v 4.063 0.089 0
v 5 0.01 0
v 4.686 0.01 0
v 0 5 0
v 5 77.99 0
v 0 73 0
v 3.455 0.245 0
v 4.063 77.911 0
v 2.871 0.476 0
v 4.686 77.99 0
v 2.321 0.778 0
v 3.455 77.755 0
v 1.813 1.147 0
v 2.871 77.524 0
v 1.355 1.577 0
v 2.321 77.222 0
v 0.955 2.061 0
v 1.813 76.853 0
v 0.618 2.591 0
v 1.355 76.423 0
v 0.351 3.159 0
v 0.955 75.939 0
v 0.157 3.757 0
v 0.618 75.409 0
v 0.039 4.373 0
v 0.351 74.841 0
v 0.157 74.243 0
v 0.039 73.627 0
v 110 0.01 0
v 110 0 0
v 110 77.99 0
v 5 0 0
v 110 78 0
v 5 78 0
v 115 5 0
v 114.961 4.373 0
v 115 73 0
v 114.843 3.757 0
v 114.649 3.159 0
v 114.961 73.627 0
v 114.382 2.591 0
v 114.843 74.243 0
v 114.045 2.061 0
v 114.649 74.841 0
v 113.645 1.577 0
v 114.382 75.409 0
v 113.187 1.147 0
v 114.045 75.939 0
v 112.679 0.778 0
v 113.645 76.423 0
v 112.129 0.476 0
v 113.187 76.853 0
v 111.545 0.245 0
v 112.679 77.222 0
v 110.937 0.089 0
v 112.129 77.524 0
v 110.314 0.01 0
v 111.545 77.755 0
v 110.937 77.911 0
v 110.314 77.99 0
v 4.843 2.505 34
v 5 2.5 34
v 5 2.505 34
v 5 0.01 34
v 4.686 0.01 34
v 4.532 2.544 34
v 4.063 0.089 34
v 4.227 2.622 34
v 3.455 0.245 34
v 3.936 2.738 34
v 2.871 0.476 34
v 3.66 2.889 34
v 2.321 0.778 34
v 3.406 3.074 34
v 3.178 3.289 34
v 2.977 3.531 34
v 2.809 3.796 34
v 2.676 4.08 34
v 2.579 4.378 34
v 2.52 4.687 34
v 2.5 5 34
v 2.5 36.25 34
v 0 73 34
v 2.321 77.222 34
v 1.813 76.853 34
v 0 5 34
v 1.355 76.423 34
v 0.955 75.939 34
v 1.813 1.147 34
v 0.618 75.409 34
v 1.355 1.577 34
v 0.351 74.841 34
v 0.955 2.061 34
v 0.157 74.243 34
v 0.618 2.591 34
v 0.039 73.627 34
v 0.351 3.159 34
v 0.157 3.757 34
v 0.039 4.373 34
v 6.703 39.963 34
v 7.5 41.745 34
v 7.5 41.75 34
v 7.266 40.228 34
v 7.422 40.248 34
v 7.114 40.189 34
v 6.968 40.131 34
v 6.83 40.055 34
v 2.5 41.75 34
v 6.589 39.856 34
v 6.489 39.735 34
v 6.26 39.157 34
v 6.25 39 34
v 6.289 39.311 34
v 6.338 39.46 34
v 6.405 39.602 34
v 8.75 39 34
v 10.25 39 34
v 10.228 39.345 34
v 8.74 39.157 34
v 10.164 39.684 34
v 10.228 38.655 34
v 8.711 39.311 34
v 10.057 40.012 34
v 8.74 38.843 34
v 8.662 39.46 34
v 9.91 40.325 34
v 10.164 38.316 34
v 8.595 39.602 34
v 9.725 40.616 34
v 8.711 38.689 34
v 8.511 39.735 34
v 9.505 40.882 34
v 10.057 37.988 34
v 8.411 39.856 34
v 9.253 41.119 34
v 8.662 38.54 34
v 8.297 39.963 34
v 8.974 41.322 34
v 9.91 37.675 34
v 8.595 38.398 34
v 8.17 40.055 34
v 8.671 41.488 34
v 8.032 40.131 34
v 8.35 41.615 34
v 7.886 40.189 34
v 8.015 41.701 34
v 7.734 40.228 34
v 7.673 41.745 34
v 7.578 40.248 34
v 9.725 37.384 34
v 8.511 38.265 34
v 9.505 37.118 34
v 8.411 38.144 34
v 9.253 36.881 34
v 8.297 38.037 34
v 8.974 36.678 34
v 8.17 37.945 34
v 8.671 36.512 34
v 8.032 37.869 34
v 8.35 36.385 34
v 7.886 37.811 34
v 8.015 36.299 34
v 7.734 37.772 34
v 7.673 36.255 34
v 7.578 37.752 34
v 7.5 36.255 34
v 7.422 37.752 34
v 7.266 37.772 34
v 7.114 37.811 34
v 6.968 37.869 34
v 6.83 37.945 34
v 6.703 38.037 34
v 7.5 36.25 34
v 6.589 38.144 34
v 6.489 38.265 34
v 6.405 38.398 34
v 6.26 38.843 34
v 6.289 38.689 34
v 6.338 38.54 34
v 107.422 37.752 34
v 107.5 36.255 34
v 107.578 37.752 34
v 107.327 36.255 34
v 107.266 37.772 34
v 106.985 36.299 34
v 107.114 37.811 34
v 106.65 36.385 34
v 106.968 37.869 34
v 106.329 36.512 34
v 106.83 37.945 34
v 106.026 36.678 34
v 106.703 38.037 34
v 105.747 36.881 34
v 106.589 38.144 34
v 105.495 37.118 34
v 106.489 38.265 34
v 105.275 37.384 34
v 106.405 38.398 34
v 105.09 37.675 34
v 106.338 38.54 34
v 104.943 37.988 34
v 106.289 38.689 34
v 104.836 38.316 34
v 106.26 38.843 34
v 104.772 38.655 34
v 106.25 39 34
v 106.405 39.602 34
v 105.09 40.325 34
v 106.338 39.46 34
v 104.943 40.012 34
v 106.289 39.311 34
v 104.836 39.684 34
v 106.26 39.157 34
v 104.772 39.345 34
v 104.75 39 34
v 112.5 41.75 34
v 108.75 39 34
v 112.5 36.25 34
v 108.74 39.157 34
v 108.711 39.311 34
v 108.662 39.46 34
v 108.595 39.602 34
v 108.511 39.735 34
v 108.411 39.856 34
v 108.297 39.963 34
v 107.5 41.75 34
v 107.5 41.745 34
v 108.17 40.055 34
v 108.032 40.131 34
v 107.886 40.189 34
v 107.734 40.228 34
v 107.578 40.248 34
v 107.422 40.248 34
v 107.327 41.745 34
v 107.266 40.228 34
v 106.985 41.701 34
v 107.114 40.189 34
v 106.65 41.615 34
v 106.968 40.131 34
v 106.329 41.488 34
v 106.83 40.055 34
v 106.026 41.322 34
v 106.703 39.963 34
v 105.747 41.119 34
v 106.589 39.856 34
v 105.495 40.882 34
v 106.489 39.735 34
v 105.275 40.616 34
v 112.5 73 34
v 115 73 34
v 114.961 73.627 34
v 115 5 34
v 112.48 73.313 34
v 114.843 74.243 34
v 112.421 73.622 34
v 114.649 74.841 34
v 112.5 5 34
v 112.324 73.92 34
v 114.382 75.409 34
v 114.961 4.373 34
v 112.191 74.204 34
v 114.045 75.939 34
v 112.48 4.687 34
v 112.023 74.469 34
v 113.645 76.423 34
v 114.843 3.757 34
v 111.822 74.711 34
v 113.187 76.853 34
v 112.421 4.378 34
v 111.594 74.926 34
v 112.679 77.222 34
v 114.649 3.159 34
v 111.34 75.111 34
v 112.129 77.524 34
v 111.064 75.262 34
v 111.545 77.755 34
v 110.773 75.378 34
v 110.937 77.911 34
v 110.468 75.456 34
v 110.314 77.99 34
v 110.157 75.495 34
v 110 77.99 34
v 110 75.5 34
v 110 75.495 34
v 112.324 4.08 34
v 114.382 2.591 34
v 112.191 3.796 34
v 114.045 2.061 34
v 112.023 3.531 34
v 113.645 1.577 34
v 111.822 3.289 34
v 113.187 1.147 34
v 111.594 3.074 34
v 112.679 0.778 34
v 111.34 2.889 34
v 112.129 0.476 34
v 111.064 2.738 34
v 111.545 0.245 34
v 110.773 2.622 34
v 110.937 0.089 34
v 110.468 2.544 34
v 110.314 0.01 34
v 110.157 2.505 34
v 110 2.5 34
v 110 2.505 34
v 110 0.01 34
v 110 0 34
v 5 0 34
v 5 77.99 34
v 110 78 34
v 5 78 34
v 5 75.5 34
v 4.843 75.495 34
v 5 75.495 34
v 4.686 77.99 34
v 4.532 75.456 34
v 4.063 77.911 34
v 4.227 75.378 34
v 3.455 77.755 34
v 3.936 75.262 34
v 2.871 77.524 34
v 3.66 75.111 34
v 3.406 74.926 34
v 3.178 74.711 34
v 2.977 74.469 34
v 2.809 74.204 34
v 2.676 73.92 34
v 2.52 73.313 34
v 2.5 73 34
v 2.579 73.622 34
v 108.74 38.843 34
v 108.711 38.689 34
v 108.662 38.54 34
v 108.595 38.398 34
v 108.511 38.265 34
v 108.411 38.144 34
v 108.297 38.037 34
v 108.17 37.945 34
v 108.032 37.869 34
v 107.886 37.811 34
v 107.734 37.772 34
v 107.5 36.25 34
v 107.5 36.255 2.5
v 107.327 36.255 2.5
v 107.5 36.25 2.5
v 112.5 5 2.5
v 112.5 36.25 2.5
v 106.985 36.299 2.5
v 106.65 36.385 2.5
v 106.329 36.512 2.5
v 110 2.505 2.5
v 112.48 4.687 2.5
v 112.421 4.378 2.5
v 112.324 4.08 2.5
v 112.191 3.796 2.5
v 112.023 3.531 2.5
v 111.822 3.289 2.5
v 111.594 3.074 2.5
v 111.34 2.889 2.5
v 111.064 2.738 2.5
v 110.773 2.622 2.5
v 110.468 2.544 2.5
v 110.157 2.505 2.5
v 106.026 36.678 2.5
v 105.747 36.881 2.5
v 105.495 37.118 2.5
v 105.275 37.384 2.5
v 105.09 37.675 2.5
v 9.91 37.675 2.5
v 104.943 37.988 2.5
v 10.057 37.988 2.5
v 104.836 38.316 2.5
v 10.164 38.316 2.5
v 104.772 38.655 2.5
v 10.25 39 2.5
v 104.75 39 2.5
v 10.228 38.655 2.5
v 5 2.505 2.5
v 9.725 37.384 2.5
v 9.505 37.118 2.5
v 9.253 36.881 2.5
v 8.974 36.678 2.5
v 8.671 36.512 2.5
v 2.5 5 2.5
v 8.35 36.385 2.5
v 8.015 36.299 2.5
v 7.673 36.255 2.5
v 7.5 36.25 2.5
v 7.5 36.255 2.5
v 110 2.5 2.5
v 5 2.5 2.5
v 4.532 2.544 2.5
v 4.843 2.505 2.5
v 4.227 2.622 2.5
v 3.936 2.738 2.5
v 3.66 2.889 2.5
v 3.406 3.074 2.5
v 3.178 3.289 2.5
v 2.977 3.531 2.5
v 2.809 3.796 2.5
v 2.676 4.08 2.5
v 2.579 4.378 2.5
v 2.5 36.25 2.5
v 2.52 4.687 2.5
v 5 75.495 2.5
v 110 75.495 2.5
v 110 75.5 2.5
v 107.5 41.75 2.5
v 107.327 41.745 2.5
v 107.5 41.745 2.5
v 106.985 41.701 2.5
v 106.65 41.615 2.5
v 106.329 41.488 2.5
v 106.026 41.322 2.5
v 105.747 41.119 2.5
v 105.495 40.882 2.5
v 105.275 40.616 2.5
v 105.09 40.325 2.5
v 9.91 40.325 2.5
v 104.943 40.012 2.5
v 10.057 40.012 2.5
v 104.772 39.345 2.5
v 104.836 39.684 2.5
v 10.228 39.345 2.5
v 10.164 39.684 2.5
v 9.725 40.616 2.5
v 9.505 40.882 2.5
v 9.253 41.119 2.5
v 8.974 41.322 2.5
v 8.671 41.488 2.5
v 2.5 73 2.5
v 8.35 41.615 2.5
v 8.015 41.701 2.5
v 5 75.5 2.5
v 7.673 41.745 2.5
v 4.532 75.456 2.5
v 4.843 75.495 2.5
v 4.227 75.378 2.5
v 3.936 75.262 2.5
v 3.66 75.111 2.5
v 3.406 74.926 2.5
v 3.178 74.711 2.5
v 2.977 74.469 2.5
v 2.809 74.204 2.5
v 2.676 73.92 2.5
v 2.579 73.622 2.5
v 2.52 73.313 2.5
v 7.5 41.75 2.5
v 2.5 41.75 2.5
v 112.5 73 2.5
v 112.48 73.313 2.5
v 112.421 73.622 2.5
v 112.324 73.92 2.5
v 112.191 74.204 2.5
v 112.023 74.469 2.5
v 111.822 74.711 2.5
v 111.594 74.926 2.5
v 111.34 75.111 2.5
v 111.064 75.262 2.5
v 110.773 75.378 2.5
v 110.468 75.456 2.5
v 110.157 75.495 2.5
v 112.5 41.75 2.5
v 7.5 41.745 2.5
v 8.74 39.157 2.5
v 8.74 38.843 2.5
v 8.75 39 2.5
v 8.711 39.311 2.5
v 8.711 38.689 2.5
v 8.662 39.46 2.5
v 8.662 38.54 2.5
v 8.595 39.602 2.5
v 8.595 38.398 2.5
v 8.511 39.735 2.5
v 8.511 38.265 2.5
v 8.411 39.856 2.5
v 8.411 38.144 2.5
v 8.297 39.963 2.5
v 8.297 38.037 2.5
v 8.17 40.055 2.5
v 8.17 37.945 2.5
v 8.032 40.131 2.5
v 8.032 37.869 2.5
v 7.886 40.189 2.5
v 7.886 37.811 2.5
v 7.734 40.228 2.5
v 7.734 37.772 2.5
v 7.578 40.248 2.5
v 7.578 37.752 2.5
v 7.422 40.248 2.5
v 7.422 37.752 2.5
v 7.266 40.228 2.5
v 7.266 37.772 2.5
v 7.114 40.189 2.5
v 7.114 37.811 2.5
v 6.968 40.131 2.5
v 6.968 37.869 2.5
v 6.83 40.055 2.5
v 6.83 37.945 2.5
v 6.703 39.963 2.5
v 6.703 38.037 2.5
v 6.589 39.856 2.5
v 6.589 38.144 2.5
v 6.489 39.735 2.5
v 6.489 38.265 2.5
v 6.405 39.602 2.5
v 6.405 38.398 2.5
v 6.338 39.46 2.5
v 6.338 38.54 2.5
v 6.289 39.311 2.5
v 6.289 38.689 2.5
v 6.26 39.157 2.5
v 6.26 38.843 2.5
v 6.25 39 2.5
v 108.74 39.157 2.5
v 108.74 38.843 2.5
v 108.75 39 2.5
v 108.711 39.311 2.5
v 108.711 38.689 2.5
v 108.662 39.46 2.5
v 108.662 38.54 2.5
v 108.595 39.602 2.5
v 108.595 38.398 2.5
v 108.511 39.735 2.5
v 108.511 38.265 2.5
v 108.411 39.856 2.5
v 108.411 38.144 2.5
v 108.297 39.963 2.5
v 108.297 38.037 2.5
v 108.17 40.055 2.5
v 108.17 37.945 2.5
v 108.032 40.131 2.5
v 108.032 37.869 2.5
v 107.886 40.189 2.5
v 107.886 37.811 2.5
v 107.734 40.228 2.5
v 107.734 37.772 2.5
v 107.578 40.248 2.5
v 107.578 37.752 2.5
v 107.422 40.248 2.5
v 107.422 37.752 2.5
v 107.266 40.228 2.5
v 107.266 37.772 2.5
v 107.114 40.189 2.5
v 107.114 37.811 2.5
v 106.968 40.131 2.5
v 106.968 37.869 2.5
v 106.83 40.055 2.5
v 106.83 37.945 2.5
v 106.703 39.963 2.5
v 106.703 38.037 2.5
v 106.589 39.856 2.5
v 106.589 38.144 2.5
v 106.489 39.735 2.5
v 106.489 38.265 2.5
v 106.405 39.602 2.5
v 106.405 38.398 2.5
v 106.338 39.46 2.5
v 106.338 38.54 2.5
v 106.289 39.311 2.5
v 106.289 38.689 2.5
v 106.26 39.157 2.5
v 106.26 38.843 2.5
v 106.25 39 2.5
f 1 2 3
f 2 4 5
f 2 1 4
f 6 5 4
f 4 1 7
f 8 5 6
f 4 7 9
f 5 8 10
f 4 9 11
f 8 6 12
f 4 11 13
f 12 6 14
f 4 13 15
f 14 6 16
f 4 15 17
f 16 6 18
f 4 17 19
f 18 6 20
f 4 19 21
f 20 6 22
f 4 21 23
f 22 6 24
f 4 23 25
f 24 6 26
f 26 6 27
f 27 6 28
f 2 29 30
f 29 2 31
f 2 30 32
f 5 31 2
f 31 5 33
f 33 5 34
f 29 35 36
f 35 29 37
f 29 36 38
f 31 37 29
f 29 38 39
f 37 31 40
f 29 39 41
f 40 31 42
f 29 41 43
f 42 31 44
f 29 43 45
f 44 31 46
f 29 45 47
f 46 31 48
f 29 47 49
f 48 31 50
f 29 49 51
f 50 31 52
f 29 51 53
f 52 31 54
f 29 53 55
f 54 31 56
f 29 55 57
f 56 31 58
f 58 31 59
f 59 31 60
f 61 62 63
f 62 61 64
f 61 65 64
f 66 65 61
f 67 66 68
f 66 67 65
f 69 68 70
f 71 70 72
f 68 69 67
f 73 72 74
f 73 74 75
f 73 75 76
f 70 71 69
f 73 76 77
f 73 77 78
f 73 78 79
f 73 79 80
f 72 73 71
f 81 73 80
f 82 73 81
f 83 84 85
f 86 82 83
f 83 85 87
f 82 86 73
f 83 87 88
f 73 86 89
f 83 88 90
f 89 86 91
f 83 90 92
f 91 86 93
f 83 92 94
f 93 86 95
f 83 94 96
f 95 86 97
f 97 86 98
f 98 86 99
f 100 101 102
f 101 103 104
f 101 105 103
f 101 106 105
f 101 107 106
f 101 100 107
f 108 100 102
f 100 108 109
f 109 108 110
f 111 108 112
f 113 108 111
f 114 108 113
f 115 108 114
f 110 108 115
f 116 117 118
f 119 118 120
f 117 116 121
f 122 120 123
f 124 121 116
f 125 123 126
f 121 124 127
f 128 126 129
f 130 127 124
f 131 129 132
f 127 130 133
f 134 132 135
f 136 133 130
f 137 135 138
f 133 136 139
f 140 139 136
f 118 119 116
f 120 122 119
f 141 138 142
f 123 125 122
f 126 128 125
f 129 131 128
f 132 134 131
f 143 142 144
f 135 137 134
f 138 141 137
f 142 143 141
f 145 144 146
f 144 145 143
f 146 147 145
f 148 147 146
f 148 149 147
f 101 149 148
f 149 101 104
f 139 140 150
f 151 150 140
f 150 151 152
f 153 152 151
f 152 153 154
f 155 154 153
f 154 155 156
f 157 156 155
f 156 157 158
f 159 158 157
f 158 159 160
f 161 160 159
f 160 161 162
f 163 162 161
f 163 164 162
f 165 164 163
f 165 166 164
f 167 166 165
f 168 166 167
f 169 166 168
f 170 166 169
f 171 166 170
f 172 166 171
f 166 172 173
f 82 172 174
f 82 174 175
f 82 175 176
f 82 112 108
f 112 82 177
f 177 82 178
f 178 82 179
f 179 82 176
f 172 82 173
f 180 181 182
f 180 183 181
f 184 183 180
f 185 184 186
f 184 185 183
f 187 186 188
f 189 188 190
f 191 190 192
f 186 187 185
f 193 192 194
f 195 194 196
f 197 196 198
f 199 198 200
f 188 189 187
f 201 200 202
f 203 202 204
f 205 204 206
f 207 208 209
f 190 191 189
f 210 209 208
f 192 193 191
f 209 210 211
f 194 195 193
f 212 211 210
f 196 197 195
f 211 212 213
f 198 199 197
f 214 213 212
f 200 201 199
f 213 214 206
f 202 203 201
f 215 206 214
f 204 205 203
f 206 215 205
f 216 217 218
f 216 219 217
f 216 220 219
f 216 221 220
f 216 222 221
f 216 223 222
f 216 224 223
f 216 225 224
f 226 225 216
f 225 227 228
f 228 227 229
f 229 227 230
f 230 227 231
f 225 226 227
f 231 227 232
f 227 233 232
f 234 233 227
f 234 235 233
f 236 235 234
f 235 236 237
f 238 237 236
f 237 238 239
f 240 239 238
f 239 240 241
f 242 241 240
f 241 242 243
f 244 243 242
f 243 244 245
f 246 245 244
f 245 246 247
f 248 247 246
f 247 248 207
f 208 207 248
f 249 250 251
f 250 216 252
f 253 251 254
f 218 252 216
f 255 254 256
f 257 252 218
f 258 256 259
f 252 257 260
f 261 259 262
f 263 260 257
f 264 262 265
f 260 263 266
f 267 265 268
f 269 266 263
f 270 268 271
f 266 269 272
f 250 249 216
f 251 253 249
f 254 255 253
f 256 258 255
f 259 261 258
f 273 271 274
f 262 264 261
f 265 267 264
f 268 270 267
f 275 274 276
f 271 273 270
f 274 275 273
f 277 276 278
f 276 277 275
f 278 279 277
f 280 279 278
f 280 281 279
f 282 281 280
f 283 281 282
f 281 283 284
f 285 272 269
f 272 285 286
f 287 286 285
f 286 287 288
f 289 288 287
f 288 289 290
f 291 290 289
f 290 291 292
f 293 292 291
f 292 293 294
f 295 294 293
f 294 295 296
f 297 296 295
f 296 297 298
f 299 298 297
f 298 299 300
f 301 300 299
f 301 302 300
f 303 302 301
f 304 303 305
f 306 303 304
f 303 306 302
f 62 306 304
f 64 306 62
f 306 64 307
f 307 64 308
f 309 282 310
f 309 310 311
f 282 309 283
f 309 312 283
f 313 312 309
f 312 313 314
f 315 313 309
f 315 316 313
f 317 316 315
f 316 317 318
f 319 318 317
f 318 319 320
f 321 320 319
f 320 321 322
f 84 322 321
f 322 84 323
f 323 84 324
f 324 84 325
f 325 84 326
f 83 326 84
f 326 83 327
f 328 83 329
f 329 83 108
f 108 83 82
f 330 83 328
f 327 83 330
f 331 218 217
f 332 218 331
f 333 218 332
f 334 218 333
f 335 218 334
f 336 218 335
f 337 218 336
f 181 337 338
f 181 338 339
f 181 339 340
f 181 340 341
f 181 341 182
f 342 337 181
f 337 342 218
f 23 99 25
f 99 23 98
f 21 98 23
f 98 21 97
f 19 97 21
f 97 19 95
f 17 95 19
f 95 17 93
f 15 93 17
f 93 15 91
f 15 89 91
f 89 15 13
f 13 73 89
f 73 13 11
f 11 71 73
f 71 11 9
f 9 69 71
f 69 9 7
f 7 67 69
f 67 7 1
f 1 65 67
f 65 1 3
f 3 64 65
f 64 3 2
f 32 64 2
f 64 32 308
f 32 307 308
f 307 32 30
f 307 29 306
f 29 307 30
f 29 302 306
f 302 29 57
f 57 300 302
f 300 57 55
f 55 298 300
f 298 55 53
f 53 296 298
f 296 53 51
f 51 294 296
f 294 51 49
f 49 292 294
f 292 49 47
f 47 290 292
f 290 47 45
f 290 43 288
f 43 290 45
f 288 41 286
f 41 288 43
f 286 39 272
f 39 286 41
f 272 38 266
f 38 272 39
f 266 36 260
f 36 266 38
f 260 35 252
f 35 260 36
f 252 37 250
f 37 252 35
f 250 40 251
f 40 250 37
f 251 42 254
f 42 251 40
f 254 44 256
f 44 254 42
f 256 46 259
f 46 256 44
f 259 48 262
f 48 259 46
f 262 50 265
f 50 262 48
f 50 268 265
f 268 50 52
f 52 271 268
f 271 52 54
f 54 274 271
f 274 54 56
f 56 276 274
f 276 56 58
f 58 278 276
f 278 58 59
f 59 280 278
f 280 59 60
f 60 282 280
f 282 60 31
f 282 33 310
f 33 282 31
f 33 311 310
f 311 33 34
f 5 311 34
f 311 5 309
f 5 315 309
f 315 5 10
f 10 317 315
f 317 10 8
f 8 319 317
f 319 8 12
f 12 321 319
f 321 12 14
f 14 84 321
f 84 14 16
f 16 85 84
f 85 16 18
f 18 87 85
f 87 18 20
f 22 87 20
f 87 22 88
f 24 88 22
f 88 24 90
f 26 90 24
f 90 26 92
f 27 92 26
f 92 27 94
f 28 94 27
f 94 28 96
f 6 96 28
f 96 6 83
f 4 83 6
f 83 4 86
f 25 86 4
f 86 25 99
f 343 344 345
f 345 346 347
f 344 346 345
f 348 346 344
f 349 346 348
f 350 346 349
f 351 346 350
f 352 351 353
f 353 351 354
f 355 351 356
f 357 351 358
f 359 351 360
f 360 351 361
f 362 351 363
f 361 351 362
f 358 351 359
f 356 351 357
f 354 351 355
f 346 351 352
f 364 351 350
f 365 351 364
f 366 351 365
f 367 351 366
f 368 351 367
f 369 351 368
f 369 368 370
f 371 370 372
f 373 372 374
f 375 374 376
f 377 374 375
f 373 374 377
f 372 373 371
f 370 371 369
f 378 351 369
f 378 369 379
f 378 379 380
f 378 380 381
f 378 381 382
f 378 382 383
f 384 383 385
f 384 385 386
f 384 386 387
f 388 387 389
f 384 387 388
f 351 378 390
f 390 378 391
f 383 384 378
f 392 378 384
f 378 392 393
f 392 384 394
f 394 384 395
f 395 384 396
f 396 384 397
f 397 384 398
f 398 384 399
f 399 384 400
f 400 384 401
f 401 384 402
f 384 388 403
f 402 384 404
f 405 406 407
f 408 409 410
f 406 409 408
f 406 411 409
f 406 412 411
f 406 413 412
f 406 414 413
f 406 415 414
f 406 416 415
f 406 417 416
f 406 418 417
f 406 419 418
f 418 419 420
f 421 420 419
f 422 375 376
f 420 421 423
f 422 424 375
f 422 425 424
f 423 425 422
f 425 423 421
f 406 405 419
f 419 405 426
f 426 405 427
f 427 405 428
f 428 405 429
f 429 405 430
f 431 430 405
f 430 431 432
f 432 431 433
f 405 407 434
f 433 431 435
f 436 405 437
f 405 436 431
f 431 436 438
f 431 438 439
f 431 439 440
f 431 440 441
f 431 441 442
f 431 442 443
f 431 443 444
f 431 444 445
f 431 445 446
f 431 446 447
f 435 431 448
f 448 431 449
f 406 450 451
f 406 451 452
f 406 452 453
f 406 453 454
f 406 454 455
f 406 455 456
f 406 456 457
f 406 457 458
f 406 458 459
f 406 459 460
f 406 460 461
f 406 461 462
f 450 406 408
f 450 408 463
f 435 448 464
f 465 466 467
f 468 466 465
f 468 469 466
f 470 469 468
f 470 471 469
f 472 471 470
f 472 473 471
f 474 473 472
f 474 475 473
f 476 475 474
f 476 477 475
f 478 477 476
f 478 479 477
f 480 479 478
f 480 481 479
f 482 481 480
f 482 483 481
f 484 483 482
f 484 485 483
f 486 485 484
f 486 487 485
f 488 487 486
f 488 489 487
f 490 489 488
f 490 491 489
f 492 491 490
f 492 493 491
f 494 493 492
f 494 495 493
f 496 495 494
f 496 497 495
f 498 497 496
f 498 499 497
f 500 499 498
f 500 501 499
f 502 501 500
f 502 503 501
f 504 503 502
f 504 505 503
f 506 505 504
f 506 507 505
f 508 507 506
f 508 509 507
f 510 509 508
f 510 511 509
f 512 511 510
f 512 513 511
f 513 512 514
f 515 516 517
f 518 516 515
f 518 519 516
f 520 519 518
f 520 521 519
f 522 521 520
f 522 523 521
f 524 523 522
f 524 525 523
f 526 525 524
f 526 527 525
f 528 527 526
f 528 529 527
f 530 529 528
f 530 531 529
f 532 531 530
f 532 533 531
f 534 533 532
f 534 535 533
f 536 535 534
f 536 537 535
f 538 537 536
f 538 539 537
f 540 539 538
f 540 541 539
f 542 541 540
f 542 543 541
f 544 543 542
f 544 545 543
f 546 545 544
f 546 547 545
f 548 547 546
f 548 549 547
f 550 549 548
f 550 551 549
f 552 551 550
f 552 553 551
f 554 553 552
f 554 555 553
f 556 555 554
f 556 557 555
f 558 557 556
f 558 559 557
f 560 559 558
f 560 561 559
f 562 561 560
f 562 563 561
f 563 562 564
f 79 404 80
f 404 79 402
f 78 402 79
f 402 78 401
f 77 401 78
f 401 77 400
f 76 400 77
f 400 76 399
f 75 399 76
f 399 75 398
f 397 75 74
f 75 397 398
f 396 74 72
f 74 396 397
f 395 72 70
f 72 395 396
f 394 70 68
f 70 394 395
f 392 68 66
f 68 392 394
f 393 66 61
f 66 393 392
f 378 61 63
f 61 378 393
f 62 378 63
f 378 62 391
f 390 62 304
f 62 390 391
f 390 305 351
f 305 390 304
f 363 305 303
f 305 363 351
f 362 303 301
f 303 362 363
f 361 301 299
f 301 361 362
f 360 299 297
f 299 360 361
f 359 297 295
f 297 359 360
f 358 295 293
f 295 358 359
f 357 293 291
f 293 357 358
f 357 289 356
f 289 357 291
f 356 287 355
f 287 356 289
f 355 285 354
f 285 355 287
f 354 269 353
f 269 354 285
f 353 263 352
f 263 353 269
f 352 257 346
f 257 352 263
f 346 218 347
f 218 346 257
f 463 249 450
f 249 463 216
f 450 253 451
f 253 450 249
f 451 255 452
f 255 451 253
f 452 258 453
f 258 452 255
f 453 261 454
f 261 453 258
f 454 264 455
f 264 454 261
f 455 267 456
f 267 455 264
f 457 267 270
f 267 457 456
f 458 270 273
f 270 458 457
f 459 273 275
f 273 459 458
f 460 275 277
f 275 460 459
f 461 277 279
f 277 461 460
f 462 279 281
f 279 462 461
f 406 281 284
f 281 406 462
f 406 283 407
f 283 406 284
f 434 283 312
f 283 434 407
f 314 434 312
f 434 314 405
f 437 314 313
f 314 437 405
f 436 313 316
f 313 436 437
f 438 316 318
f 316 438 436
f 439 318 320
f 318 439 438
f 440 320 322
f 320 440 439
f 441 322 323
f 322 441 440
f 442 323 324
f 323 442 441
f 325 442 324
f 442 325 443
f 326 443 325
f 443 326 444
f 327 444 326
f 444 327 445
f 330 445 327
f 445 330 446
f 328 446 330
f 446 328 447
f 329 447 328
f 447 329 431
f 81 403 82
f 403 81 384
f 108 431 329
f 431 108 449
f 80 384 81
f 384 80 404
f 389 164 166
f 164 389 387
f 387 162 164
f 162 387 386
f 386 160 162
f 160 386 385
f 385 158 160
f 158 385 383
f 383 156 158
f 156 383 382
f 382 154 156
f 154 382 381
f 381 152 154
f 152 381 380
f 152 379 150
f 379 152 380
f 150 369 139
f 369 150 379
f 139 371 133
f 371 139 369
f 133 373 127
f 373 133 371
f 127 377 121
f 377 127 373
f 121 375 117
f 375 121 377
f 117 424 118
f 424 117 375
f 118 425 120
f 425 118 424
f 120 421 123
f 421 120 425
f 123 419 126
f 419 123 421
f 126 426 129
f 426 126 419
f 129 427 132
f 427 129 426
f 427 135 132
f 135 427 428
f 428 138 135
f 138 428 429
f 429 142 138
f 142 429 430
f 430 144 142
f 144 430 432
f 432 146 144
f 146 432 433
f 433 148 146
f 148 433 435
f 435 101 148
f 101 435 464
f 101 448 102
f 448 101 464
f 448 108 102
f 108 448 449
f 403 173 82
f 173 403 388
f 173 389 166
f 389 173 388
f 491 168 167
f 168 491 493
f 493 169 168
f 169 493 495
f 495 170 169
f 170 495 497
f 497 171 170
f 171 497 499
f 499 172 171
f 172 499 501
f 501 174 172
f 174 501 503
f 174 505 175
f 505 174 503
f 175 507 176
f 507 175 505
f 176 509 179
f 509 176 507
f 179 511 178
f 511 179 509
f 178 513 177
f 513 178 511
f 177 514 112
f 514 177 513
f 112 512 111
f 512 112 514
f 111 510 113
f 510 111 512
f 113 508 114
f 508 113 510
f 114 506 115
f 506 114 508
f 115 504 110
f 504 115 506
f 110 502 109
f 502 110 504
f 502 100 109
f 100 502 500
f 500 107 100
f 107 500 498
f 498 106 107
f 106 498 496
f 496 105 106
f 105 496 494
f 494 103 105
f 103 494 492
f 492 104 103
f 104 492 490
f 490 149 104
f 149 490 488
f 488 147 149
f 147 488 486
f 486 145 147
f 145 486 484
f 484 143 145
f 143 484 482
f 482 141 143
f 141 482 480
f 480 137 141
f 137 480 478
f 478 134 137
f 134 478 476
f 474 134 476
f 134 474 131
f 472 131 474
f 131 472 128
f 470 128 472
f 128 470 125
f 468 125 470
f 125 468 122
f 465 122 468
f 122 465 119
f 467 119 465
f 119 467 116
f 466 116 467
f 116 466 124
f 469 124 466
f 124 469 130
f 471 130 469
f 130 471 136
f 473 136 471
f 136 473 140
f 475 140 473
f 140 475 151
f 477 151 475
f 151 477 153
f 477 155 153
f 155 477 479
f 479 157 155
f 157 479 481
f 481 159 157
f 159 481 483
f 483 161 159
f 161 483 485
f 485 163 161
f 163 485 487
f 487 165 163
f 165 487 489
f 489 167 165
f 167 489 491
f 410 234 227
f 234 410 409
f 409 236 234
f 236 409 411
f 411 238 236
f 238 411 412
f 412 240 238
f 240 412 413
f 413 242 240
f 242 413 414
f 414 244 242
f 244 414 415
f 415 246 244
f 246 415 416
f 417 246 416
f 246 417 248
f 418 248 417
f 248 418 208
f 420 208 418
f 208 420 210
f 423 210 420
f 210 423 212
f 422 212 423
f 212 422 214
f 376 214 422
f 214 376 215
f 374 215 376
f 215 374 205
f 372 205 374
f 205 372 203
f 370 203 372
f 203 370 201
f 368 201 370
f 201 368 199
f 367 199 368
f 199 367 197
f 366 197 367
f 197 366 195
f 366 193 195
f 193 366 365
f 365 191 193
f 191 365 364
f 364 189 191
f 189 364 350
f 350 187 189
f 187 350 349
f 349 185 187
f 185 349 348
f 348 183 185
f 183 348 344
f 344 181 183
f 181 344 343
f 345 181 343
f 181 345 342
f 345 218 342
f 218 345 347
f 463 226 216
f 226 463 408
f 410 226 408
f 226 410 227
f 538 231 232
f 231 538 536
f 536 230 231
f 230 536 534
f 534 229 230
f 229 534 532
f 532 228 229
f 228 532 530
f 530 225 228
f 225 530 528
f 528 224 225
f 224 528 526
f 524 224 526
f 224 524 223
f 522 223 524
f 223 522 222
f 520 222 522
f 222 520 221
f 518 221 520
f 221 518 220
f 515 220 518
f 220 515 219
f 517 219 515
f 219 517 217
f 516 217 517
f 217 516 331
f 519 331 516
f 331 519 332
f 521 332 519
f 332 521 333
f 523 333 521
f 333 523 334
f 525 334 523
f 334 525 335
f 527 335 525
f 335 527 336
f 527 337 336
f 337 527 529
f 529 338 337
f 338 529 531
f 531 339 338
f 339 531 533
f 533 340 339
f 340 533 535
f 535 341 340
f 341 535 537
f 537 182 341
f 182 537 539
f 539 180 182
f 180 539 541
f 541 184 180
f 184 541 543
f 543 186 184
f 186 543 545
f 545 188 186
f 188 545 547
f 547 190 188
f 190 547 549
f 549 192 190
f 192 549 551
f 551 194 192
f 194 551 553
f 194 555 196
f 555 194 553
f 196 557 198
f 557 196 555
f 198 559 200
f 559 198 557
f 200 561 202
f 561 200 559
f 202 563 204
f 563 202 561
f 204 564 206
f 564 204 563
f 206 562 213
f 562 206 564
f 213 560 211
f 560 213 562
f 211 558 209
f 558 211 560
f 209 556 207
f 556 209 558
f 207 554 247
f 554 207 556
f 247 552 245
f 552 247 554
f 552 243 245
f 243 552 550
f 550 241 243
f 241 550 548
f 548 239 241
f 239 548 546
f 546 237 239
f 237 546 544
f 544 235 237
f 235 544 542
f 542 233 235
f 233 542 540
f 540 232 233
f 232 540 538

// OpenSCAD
$fn=50;
module main()
{
	module roundedsquare(r,w,h)
	{
		union()
		{
			translate([r,r])circle(r=r);
			translate([r,w-r])circle(r=r);
			translate([h-r,r])circle(r=r);
			translate([h-r,w-r])circle(r=r);
			translate([0,r])square([h,w-(r*2)]);	
			translate([r,0])square([h-(r*2),w]);
		}	
	}
	
	module mount()
	{
		linear_extrude(height=34)
		{
			difference()
			{
				union()
				{
					circle(r=5.5/2);
					translate([-6,-5.5/2])square([6,5.5]);
				}
				circle(r=2.5/2);
			}
			
		}	
	}

	difference()
	{	
	linear_extrude(height=34)
	roundedsquare(r=5,w=78,h=115);
	
	translate([2.5,2.5,2.5])linear_extrude(height=40)
	roundedsquare(r=5-2.5,w=78-5,h=115-5);
    }
    
    translate([7.5,78/2,0])mount();

    translate([115-7.5,78/2,0])	rotate([0,0,180])mount();
}

main();
